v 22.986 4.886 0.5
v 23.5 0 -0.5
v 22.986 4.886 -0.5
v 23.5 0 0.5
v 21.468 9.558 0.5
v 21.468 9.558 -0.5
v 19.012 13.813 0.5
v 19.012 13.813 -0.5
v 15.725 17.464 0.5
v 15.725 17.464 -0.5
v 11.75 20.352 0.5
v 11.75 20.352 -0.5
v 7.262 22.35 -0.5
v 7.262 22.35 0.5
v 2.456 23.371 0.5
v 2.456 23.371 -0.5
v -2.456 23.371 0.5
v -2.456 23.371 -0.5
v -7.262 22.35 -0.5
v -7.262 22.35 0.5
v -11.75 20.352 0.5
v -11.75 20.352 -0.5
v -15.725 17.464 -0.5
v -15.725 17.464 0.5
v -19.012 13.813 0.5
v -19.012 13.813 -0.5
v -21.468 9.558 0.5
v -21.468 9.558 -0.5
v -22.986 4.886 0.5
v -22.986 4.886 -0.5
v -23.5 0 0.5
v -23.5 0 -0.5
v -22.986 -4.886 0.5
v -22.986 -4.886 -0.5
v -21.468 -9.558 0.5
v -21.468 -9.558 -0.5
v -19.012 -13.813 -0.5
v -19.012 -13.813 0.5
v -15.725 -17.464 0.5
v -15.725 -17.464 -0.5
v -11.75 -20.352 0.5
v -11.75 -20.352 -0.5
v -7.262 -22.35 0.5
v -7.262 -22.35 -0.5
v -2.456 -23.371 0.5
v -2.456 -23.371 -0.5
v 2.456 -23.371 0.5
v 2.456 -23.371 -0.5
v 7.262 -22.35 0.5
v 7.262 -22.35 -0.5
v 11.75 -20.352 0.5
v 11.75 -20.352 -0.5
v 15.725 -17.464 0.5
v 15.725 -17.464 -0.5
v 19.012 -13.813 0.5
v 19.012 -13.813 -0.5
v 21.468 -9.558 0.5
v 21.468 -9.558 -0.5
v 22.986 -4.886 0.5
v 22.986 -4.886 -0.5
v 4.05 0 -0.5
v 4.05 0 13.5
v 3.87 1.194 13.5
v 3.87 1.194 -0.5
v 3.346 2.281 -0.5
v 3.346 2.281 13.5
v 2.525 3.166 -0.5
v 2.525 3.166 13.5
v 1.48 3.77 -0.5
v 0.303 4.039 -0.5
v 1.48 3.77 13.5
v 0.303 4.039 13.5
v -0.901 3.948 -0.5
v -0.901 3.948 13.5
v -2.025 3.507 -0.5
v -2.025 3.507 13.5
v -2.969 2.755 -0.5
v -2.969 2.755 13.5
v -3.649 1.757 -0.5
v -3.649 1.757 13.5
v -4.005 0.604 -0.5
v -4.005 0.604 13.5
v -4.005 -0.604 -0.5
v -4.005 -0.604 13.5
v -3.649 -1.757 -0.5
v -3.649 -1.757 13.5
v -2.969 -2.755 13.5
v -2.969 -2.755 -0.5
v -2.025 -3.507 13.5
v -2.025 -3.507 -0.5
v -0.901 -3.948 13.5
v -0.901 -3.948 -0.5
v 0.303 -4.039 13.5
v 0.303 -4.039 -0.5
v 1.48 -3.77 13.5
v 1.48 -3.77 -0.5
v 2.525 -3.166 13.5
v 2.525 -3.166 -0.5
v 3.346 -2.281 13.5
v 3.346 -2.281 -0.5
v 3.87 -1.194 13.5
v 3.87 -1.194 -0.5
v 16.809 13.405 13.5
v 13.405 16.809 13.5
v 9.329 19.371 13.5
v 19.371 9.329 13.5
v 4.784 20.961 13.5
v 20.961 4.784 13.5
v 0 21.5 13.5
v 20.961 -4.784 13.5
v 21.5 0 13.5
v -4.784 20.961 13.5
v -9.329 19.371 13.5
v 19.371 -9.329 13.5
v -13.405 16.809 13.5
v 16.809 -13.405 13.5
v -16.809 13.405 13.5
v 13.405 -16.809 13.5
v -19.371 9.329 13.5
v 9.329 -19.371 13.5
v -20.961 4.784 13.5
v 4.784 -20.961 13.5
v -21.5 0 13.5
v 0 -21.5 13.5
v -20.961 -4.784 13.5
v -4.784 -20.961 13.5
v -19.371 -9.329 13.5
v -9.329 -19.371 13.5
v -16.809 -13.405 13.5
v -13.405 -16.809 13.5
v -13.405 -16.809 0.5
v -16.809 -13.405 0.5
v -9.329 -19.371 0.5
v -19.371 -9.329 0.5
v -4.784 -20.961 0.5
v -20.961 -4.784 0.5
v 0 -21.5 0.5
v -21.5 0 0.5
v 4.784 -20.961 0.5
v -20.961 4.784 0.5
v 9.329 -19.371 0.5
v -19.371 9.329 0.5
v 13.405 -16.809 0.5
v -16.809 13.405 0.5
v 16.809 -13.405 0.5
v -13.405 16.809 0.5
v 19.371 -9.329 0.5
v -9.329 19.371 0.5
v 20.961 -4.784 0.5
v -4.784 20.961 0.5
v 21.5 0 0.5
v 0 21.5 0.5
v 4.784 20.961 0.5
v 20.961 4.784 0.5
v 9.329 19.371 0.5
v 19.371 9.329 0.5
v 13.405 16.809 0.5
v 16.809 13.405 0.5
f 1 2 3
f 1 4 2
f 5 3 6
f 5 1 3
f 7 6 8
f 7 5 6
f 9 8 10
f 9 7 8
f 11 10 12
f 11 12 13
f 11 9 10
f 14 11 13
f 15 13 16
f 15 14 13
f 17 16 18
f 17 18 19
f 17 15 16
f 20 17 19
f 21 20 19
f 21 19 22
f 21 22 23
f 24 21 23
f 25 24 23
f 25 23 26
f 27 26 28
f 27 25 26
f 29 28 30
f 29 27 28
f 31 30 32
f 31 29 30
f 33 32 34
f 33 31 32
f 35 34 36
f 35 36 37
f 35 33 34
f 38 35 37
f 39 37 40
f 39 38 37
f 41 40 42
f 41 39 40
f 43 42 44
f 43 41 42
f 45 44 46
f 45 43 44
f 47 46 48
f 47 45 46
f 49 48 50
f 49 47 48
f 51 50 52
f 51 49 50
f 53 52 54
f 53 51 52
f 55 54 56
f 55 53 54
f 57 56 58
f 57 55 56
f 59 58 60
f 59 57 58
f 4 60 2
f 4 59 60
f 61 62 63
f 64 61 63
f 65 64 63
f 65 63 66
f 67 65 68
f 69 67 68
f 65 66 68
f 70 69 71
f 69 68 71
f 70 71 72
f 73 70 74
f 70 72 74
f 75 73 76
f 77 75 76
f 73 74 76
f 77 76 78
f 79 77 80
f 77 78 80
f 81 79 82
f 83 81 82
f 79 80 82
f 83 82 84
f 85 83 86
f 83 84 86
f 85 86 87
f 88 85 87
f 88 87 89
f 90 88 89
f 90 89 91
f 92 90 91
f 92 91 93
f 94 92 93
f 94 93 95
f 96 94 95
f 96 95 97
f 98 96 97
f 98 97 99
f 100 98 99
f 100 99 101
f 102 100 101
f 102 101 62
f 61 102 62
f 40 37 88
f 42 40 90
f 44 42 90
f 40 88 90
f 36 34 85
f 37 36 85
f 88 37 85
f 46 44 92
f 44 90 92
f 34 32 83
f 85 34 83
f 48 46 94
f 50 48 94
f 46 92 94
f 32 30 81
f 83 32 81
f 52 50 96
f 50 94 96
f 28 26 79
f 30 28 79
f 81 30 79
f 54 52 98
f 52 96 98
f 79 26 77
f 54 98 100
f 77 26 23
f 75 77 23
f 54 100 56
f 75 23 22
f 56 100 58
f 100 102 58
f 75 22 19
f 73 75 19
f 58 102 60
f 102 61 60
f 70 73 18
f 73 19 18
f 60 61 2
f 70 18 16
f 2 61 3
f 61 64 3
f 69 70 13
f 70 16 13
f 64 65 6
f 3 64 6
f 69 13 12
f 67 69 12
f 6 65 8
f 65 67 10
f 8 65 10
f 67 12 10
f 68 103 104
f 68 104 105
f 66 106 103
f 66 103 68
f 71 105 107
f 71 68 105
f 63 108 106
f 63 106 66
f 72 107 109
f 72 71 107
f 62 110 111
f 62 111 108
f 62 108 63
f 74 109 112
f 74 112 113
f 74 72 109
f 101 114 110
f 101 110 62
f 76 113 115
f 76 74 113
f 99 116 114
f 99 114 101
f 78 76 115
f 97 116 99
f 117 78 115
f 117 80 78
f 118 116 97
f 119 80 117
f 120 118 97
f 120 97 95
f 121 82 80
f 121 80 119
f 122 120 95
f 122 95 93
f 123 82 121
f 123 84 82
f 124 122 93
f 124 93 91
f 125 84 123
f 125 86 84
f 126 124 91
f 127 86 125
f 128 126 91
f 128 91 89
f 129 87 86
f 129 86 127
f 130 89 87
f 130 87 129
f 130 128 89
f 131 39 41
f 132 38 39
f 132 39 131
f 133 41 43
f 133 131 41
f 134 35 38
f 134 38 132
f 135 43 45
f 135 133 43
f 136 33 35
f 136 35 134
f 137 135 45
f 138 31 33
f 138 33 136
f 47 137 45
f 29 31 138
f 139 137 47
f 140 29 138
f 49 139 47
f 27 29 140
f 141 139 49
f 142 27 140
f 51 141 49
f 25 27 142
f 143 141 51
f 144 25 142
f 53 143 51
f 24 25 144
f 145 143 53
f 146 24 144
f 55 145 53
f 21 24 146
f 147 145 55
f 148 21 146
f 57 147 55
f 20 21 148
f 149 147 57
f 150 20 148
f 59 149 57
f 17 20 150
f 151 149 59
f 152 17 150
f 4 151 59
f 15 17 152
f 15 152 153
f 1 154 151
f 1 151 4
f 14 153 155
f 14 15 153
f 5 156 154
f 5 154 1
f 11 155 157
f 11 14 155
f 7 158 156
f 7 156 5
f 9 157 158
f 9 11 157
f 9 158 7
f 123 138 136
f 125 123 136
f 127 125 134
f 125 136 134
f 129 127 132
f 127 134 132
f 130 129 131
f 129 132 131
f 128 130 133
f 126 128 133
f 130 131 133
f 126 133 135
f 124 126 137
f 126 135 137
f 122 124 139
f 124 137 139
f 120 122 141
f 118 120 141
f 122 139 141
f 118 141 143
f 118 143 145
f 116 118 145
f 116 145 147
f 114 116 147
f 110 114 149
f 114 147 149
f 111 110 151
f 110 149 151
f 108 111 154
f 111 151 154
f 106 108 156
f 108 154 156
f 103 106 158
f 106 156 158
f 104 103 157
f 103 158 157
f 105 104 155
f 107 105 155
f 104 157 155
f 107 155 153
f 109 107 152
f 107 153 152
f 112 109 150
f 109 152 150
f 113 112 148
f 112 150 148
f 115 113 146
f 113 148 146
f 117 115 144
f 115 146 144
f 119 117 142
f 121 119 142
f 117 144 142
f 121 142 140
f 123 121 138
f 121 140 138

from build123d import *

# Parameters (mm, degrees)
CROQUIS1_R              = 23.5
SALIENTE_EXTRUIR1_DEPTH = 0.5
CROQUIS2_R              = 21.5
SALIENTE_EXTRUIR2_DEPTH = 13
CROQUIS3_R              = 4.05
CORTAR_EXTRUIR1_DEPTH   = 40


with BuildPart() as part:
    # Croquis1 → Saliente-Extruir1 (new, symmetric)
    with BuildSketch(Plane.XY):
        Circle(CROQUIS1_R)
    extrude(amount=SALIENTE_EXTRUIR1_DEPTH, both=True)

    # Croquis2 → Saliente-Extruir2 (add)
    with BuildSketch(Plane.XY.offset(0.5)):
        with Locations(Location((0, 0, 0), (0, 0, 180))):
            Circle(CROQUIS2_R)
    extrude(amount=SALIENTE_EXTRUIR2_DEPTH)

    # Croquis3 → Cortar-Extruir1 (cut)
    with BuildSketch(Plane.XY.offset(13.5)):
        Circle(CROQUIS3_R)
    extrude(amount=-CORTAR_EXTRUIR1_DEPTH, mode=Mode.SUBTRACT)


solid = part.part
